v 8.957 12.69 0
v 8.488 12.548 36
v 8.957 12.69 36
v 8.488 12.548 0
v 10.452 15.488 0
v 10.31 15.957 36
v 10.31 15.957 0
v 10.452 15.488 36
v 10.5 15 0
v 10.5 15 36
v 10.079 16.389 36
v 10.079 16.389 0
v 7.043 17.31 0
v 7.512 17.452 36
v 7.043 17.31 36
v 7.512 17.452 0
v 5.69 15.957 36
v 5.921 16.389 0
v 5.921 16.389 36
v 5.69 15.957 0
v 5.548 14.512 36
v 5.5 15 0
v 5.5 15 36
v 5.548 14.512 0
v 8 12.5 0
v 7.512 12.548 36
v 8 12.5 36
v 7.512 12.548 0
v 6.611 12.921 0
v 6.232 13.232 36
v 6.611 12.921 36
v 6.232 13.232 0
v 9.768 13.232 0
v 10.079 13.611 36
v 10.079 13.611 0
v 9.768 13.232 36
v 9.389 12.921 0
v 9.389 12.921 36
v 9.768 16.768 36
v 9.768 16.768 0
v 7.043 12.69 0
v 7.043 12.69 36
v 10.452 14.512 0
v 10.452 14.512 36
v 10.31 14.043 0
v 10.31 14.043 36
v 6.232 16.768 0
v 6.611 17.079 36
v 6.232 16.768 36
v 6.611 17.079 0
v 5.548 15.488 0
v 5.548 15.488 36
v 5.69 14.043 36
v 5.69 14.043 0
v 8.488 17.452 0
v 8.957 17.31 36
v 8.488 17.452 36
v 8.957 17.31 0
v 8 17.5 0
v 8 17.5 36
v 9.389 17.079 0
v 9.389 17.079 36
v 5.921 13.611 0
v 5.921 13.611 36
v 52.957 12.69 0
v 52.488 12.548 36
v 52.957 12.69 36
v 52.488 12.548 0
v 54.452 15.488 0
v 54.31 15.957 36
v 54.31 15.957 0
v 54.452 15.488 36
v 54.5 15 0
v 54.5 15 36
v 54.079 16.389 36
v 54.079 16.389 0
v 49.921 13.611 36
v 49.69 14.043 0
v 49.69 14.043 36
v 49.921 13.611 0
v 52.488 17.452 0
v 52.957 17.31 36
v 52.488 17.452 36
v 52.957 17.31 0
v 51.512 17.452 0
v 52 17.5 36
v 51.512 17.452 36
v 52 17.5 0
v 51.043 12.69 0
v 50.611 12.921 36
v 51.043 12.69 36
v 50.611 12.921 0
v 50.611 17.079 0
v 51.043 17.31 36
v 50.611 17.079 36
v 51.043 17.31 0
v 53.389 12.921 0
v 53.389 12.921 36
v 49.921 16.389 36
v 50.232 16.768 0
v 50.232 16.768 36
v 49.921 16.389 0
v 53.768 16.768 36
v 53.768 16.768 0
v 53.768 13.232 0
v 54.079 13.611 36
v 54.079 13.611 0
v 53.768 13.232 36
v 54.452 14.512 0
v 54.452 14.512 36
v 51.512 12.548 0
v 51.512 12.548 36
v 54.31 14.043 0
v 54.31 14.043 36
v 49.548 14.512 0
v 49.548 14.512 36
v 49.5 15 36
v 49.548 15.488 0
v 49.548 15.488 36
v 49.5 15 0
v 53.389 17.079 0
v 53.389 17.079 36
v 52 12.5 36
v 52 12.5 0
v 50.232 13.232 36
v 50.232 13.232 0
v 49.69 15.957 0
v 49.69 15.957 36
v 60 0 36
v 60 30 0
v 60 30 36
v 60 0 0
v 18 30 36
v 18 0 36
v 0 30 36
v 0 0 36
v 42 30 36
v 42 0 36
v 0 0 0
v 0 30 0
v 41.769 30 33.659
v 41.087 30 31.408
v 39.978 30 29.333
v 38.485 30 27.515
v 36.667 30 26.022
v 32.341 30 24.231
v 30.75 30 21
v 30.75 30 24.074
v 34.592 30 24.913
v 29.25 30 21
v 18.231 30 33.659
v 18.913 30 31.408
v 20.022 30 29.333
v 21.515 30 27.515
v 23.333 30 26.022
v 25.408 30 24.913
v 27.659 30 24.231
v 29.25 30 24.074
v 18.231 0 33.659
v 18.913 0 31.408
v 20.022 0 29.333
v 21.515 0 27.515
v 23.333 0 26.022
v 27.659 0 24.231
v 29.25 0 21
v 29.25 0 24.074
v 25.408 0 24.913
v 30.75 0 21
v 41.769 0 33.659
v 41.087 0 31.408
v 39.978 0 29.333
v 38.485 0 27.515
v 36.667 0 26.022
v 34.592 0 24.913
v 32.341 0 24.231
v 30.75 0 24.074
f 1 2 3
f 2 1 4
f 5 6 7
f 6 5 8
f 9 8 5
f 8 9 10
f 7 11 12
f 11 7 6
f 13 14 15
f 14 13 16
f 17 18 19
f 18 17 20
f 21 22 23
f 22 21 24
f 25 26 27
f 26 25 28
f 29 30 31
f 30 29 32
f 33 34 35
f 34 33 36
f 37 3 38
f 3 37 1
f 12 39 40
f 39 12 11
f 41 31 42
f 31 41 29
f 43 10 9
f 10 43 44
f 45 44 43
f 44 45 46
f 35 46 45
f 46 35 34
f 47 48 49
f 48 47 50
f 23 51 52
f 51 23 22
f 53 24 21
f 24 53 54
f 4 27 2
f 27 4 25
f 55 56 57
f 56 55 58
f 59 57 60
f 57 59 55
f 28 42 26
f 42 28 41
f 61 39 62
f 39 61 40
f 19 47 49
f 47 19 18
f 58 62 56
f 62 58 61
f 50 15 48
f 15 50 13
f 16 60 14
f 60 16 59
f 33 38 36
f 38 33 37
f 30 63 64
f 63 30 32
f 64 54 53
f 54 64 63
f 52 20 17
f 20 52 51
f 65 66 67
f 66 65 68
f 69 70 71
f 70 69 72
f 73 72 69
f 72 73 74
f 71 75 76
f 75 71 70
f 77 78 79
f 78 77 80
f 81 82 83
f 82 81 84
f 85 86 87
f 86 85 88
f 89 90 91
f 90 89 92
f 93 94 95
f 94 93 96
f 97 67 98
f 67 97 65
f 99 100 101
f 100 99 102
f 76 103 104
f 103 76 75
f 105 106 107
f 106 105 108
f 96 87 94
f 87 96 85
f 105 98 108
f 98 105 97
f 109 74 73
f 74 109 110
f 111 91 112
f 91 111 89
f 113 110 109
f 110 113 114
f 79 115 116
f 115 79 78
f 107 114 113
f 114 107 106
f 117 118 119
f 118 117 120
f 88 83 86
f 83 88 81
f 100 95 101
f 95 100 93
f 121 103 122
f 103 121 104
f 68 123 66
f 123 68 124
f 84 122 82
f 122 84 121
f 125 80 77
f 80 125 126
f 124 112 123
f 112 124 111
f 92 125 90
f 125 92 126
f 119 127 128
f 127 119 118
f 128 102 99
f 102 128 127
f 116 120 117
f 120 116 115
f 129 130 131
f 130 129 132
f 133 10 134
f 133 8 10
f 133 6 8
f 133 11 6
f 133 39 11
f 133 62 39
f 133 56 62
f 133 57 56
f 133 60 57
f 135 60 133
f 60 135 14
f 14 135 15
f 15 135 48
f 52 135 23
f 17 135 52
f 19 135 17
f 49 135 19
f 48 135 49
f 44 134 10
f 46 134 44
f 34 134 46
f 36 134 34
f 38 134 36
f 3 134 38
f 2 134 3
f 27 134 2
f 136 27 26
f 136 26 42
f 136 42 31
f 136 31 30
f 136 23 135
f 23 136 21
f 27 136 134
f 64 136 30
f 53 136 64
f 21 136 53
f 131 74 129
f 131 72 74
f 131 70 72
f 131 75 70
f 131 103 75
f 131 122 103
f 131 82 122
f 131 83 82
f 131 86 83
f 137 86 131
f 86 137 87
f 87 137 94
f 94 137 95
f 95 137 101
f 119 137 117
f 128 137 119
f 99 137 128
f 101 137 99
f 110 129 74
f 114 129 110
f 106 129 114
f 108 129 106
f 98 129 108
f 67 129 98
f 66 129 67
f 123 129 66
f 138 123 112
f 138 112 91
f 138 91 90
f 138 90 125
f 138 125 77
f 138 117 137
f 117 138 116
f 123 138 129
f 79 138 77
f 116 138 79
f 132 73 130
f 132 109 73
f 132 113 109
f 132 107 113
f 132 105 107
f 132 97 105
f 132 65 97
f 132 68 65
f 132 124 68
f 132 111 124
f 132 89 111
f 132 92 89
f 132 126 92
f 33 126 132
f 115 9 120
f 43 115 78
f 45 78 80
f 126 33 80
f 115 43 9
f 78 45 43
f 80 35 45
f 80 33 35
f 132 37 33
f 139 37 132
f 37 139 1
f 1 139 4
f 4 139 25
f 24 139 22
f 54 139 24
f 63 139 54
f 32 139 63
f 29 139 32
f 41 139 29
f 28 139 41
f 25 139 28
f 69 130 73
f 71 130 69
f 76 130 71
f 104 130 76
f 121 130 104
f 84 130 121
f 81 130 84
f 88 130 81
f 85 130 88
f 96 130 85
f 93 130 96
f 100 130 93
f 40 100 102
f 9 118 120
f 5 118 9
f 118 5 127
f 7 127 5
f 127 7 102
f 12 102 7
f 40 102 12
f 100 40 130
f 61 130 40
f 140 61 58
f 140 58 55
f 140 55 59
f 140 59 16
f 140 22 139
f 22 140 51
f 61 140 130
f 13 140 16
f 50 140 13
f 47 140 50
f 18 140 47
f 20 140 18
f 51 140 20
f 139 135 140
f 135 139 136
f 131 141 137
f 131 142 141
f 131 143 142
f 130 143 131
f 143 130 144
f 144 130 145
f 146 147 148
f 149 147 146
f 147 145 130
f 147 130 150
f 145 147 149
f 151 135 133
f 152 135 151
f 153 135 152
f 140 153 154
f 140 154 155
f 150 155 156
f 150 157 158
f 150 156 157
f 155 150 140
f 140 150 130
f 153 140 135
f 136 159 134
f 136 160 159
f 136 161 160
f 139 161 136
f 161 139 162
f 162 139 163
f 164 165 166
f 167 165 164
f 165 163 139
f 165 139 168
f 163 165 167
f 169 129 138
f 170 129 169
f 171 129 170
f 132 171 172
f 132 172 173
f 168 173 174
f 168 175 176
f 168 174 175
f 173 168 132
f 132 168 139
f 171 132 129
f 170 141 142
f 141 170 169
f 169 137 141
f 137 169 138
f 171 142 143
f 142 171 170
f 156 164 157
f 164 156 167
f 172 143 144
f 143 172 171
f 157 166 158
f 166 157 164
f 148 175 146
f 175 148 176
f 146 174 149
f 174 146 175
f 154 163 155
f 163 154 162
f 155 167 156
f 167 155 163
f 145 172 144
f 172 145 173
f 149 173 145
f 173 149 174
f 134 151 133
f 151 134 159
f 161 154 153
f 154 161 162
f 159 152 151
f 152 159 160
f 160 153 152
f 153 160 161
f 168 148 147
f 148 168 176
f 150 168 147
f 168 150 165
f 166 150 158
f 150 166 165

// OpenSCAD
$fn = 32;

// ----------------------------------------------------------------------
// Saddle clamp: split shaft clamp
// ----------------------------------------------------------------------

// --- parameters (mm) ---
blk_l = 60;               // block length, X
blk_w = 30;               // block width, Y
blk_h = 36;               // block height
clamp_r = 12;             // shaft groove radius
hole_r = 2.5;             // bolt hole radius
hole_m = 8;               // bolt hole margin from the ends
saw_w = 1.5;              // saw kerf width

saw_depth = clamp_r + 3;  // saw kerf depth

difference() {
  cube([blk_l, blk_w, blk_h]);
  translate([blk_l / 2, -1, blk_h])
    rotate([-90, 0, 0])
      cylinder(h = blk_w + 2, r = clamp_r);
  for (sx = [0, 1])
    translate([sx ? blk_l - hole_m : hole_m, blk_w / 2, -1])
      cylinder(r = hole_r, h = blk_h + 2);
  translate([blk_l / 2 - saw_w / 2, -1, blk_h - saw_depth])
    cube([saw_w, blk_w + 2, saw_depth + 1]);
}
